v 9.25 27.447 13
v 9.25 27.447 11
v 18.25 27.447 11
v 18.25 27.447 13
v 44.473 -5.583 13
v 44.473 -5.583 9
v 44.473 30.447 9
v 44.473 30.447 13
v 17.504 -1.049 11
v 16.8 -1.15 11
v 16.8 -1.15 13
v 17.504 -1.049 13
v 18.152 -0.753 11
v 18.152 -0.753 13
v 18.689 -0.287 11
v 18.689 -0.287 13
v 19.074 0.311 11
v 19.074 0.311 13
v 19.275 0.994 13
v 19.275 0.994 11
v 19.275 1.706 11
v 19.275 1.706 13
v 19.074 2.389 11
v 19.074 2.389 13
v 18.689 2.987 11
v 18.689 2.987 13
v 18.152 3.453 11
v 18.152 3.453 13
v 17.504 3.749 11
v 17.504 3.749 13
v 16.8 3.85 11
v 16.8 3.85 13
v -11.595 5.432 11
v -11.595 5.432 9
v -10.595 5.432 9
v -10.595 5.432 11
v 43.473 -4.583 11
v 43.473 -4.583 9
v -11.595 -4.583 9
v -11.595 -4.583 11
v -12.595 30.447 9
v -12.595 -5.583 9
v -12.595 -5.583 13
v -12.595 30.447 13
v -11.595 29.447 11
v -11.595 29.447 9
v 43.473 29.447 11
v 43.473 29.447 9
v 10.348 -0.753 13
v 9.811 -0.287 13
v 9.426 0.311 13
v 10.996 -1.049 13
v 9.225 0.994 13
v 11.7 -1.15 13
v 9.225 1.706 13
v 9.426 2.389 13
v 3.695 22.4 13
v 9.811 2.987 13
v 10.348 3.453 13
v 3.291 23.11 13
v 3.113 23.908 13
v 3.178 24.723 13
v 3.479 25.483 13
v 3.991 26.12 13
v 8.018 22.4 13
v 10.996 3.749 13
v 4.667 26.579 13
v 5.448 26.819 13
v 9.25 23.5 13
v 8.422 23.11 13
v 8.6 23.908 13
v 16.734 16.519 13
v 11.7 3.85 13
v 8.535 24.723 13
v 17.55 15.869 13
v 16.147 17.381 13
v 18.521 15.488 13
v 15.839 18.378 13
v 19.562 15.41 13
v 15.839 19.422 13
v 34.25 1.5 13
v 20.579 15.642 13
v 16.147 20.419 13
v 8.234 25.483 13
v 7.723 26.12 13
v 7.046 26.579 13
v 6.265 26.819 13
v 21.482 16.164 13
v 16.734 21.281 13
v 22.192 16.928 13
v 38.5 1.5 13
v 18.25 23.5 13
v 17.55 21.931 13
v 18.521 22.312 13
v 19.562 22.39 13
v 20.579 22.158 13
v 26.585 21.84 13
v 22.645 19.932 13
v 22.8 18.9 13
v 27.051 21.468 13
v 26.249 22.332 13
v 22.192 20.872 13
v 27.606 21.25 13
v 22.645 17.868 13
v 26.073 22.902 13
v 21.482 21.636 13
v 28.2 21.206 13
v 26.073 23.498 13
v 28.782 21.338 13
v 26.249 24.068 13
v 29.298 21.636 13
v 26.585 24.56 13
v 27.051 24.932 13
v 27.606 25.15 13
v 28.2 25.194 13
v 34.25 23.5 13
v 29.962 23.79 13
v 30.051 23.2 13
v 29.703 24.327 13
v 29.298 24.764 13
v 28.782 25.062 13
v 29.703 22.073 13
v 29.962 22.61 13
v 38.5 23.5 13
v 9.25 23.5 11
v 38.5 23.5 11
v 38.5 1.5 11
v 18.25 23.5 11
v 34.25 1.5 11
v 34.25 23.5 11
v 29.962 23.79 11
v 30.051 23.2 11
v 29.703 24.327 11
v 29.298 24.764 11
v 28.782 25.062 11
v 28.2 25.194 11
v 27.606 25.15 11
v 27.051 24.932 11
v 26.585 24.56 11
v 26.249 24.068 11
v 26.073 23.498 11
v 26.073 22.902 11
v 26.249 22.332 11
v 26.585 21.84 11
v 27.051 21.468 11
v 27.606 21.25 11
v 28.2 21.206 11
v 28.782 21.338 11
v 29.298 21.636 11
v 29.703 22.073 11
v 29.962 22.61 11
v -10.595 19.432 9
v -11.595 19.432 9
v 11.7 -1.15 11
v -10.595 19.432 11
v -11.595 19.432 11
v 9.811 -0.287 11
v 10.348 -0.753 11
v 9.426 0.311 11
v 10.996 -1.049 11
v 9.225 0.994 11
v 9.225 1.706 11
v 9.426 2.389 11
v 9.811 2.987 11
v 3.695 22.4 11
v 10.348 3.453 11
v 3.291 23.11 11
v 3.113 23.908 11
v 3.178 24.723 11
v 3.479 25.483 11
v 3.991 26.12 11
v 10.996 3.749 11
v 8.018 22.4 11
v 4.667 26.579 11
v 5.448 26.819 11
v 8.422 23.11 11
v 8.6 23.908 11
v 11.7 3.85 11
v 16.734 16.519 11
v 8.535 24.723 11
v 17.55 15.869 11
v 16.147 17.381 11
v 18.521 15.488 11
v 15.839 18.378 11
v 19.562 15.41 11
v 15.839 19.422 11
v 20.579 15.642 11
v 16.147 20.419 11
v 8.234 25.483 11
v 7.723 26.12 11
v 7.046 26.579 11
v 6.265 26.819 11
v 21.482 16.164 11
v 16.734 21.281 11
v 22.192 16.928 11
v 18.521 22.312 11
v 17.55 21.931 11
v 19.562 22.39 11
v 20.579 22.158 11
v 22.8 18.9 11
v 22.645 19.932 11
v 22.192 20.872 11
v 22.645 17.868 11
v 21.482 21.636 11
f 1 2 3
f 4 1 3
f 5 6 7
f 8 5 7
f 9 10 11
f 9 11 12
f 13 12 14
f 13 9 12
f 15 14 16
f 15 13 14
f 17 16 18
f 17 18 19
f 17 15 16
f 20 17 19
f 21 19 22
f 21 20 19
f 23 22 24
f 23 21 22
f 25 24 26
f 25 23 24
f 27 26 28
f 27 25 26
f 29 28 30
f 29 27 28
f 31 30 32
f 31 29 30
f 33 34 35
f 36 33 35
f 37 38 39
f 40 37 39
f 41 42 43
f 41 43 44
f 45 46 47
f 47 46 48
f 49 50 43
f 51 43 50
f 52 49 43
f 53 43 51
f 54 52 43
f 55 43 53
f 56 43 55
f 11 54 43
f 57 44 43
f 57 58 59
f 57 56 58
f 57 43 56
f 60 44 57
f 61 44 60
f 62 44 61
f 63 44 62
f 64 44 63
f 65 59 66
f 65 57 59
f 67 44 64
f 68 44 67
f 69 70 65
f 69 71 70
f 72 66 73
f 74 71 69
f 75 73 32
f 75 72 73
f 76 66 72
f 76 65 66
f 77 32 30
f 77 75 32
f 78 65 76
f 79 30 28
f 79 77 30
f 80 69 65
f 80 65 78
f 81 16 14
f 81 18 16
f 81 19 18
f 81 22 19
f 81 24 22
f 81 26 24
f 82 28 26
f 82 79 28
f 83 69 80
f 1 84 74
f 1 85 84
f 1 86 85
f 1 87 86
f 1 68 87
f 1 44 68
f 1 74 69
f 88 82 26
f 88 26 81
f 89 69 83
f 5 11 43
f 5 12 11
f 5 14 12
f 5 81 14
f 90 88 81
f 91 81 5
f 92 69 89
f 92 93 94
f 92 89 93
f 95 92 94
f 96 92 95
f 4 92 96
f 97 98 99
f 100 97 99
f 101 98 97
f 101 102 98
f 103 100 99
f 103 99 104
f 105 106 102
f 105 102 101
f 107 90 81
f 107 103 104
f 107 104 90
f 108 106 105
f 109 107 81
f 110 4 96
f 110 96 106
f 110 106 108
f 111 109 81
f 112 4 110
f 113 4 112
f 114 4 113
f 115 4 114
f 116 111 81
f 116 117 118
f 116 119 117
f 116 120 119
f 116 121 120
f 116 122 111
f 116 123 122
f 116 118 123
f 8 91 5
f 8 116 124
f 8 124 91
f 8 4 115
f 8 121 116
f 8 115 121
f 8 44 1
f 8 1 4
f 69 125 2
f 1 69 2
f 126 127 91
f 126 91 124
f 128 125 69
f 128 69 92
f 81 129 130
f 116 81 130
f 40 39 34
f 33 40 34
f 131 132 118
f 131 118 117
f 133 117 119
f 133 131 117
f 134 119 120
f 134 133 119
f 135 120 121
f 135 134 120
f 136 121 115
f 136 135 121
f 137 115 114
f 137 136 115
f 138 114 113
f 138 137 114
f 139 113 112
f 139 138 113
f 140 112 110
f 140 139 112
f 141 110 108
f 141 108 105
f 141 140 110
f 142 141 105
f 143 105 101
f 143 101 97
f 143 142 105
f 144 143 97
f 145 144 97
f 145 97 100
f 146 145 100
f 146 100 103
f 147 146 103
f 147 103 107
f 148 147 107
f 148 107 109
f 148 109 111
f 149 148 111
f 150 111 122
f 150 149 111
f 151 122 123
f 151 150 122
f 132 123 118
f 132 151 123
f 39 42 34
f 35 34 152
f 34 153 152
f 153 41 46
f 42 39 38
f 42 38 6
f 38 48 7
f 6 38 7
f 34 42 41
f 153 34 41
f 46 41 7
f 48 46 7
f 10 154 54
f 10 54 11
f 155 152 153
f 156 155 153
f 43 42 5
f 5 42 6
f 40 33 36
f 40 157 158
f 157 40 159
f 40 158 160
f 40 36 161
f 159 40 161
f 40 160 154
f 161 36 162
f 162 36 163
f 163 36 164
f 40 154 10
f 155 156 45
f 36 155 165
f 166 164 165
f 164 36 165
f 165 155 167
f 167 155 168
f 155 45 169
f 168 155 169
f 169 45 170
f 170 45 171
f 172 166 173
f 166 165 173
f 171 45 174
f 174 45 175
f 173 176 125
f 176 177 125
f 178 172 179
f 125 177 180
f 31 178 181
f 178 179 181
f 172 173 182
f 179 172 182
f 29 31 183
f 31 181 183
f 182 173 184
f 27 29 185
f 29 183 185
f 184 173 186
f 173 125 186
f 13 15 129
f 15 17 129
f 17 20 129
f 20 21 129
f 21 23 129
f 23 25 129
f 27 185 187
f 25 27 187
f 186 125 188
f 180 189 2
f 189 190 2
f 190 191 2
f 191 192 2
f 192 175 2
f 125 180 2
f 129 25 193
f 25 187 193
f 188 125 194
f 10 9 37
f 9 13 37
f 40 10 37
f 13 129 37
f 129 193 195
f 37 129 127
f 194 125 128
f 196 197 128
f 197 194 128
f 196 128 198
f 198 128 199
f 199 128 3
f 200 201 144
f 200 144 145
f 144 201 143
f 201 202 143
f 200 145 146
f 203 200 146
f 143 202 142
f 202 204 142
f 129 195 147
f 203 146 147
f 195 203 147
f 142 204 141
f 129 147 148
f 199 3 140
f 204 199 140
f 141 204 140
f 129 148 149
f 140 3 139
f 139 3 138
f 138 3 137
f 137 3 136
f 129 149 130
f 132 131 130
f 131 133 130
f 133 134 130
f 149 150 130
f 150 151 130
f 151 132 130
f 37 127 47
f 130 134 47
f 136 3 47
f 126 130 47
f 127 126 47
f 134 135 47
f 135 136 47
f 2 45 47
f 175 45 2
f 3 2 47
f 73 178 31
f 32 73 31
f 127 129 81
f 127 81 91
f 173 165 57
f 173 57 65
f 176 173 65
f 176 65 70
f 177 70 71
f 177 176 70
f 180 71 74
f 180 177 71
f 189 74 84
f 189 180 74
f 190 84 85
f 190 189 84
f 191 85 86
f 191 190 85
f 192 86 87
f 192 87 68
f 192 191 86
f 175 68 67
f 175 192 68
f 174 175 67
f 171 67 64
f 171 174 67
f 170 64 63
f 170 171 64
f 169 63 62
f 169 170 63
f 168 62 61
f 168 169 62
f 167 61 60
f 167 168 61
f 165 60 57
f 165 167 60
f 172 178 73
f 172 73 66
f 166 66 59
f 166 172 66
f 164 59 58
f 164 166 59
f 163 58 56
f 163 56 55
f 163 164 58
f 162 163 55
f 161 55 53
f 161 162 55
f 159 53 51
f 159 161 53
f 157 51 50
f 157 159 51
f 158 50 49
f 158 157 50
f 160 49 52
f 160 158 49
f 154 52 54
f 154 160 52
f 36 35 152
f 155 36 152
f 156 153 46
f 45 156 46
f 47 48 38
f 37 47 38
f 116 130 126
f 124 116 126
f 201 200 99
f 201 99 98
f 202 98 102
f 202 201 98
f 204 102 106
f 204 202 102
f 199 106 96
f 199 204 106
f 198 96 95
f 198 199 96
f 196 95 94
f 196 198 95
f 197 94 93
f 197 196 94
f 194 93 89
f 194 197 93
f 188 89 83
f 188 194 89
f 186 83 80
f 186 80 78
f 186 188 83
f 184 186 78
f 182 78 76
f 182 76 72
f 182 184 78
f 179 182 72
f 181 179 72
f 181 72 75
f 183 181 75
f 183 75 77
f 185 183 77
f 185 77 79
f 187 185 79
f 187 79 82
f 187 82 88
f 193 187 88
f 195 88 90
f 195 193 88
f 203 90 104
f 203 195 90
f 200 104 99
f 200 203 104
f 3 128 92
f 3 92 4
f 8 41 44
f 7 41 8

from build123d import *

# Parameters (mm, degrees)
SKETCH004_W      = 57.0675
SKETCH004_H      = 36.03
EXTRUDE004_DEPTH = 2
SKETCH005_W      = 57.0675
SKETCH005_H      = 36.03
SKETCH005_R      = 3.5
SKETCH005_R_2    = 2
SKETCH005_W_2    = 9
SKETCH005_H_2    = 3.9474
SKETCH005_W_3    = 4.25
SKETCH005_H_3    = 22
EXTRUDE005_DEPTH = 2


with BuildPart() as encaixe_externo001:
    # Sketch004 → Extrude004 (new body)
    with BuildSketch(Plane.XY.offset(9)):
        with Locations((15.9391, 12.4324)):
            Rectangle(SKETCH004_W, SKETCH004_H)
        Polygon((-11.59465, 29.4474), (43.47285, 29.4474), (43.47285, -4.5826), (-11.59465, -4.5826), (-11.59465, 5.4324), (-10.59465, 5.4324), (-10.59465, 19.4324), (-11.59465, 19.4324), align=None, mode=Mode.SUBTRACT)
    extrude(amount=EXTRUDE004_DEPTH)


with BuildPart() as tampa002:
    # Sketch005 → Extrude005 (new body)
    with BuildSketch(Plane.XY.offset(11)):
        with Locations((15.9391, 12.4324)):
            Rectangle(SKETCH005_W, SKETCH005_H)
        with Locations((19.3, 18.9)):
            Circle(SKETCH005_R, mode=Mode.SUBTRACT)
        with Locations((28.05086, 23.2)):
            Circle(SKETCH005_R_2, mode=Mode.SUBTRACT)
        with BuildLine():
            ThreePointArc((8.018237, 22.4), (5.85664, 26.85), (3.695043, 22.4))
            Line((3.695043, 22.4), (8.018237, 22.4))
        make_face(mode=Mode.SUBTRACT)
        with Locations((13.75, 25.4737)):
            Rectangle(SKETCH005_W_2, SKETCH005_H_2, mode=Mode.SUBTRACT)
        with Locations((36.375, 12.5)):
            Rectangle(SKETCH005_W_3, SKETCH005_H_3, mode=Mode.SUBTRACT)
        with BuildLine():
            ThreePointArc((11.7, 3.85), (9.2, 1.35), (11.7, -1.15))
            Line((11.7, -1.15), (16.8, -1.15))
            ThreePointArc((16.8, -1.15), (19.3, 1.35), (16.8, 3.85))
            Line((11.7, 3.85), (16.8, 3.85))
        make_face(mode=Mode.SUBTRACT)
    extrude(amount=EXTRUDE005_DEPTH)

    # Fusion001: union Encaixe Externo001
    add(encaixe_externo001.part)


solid = tampa002.part
